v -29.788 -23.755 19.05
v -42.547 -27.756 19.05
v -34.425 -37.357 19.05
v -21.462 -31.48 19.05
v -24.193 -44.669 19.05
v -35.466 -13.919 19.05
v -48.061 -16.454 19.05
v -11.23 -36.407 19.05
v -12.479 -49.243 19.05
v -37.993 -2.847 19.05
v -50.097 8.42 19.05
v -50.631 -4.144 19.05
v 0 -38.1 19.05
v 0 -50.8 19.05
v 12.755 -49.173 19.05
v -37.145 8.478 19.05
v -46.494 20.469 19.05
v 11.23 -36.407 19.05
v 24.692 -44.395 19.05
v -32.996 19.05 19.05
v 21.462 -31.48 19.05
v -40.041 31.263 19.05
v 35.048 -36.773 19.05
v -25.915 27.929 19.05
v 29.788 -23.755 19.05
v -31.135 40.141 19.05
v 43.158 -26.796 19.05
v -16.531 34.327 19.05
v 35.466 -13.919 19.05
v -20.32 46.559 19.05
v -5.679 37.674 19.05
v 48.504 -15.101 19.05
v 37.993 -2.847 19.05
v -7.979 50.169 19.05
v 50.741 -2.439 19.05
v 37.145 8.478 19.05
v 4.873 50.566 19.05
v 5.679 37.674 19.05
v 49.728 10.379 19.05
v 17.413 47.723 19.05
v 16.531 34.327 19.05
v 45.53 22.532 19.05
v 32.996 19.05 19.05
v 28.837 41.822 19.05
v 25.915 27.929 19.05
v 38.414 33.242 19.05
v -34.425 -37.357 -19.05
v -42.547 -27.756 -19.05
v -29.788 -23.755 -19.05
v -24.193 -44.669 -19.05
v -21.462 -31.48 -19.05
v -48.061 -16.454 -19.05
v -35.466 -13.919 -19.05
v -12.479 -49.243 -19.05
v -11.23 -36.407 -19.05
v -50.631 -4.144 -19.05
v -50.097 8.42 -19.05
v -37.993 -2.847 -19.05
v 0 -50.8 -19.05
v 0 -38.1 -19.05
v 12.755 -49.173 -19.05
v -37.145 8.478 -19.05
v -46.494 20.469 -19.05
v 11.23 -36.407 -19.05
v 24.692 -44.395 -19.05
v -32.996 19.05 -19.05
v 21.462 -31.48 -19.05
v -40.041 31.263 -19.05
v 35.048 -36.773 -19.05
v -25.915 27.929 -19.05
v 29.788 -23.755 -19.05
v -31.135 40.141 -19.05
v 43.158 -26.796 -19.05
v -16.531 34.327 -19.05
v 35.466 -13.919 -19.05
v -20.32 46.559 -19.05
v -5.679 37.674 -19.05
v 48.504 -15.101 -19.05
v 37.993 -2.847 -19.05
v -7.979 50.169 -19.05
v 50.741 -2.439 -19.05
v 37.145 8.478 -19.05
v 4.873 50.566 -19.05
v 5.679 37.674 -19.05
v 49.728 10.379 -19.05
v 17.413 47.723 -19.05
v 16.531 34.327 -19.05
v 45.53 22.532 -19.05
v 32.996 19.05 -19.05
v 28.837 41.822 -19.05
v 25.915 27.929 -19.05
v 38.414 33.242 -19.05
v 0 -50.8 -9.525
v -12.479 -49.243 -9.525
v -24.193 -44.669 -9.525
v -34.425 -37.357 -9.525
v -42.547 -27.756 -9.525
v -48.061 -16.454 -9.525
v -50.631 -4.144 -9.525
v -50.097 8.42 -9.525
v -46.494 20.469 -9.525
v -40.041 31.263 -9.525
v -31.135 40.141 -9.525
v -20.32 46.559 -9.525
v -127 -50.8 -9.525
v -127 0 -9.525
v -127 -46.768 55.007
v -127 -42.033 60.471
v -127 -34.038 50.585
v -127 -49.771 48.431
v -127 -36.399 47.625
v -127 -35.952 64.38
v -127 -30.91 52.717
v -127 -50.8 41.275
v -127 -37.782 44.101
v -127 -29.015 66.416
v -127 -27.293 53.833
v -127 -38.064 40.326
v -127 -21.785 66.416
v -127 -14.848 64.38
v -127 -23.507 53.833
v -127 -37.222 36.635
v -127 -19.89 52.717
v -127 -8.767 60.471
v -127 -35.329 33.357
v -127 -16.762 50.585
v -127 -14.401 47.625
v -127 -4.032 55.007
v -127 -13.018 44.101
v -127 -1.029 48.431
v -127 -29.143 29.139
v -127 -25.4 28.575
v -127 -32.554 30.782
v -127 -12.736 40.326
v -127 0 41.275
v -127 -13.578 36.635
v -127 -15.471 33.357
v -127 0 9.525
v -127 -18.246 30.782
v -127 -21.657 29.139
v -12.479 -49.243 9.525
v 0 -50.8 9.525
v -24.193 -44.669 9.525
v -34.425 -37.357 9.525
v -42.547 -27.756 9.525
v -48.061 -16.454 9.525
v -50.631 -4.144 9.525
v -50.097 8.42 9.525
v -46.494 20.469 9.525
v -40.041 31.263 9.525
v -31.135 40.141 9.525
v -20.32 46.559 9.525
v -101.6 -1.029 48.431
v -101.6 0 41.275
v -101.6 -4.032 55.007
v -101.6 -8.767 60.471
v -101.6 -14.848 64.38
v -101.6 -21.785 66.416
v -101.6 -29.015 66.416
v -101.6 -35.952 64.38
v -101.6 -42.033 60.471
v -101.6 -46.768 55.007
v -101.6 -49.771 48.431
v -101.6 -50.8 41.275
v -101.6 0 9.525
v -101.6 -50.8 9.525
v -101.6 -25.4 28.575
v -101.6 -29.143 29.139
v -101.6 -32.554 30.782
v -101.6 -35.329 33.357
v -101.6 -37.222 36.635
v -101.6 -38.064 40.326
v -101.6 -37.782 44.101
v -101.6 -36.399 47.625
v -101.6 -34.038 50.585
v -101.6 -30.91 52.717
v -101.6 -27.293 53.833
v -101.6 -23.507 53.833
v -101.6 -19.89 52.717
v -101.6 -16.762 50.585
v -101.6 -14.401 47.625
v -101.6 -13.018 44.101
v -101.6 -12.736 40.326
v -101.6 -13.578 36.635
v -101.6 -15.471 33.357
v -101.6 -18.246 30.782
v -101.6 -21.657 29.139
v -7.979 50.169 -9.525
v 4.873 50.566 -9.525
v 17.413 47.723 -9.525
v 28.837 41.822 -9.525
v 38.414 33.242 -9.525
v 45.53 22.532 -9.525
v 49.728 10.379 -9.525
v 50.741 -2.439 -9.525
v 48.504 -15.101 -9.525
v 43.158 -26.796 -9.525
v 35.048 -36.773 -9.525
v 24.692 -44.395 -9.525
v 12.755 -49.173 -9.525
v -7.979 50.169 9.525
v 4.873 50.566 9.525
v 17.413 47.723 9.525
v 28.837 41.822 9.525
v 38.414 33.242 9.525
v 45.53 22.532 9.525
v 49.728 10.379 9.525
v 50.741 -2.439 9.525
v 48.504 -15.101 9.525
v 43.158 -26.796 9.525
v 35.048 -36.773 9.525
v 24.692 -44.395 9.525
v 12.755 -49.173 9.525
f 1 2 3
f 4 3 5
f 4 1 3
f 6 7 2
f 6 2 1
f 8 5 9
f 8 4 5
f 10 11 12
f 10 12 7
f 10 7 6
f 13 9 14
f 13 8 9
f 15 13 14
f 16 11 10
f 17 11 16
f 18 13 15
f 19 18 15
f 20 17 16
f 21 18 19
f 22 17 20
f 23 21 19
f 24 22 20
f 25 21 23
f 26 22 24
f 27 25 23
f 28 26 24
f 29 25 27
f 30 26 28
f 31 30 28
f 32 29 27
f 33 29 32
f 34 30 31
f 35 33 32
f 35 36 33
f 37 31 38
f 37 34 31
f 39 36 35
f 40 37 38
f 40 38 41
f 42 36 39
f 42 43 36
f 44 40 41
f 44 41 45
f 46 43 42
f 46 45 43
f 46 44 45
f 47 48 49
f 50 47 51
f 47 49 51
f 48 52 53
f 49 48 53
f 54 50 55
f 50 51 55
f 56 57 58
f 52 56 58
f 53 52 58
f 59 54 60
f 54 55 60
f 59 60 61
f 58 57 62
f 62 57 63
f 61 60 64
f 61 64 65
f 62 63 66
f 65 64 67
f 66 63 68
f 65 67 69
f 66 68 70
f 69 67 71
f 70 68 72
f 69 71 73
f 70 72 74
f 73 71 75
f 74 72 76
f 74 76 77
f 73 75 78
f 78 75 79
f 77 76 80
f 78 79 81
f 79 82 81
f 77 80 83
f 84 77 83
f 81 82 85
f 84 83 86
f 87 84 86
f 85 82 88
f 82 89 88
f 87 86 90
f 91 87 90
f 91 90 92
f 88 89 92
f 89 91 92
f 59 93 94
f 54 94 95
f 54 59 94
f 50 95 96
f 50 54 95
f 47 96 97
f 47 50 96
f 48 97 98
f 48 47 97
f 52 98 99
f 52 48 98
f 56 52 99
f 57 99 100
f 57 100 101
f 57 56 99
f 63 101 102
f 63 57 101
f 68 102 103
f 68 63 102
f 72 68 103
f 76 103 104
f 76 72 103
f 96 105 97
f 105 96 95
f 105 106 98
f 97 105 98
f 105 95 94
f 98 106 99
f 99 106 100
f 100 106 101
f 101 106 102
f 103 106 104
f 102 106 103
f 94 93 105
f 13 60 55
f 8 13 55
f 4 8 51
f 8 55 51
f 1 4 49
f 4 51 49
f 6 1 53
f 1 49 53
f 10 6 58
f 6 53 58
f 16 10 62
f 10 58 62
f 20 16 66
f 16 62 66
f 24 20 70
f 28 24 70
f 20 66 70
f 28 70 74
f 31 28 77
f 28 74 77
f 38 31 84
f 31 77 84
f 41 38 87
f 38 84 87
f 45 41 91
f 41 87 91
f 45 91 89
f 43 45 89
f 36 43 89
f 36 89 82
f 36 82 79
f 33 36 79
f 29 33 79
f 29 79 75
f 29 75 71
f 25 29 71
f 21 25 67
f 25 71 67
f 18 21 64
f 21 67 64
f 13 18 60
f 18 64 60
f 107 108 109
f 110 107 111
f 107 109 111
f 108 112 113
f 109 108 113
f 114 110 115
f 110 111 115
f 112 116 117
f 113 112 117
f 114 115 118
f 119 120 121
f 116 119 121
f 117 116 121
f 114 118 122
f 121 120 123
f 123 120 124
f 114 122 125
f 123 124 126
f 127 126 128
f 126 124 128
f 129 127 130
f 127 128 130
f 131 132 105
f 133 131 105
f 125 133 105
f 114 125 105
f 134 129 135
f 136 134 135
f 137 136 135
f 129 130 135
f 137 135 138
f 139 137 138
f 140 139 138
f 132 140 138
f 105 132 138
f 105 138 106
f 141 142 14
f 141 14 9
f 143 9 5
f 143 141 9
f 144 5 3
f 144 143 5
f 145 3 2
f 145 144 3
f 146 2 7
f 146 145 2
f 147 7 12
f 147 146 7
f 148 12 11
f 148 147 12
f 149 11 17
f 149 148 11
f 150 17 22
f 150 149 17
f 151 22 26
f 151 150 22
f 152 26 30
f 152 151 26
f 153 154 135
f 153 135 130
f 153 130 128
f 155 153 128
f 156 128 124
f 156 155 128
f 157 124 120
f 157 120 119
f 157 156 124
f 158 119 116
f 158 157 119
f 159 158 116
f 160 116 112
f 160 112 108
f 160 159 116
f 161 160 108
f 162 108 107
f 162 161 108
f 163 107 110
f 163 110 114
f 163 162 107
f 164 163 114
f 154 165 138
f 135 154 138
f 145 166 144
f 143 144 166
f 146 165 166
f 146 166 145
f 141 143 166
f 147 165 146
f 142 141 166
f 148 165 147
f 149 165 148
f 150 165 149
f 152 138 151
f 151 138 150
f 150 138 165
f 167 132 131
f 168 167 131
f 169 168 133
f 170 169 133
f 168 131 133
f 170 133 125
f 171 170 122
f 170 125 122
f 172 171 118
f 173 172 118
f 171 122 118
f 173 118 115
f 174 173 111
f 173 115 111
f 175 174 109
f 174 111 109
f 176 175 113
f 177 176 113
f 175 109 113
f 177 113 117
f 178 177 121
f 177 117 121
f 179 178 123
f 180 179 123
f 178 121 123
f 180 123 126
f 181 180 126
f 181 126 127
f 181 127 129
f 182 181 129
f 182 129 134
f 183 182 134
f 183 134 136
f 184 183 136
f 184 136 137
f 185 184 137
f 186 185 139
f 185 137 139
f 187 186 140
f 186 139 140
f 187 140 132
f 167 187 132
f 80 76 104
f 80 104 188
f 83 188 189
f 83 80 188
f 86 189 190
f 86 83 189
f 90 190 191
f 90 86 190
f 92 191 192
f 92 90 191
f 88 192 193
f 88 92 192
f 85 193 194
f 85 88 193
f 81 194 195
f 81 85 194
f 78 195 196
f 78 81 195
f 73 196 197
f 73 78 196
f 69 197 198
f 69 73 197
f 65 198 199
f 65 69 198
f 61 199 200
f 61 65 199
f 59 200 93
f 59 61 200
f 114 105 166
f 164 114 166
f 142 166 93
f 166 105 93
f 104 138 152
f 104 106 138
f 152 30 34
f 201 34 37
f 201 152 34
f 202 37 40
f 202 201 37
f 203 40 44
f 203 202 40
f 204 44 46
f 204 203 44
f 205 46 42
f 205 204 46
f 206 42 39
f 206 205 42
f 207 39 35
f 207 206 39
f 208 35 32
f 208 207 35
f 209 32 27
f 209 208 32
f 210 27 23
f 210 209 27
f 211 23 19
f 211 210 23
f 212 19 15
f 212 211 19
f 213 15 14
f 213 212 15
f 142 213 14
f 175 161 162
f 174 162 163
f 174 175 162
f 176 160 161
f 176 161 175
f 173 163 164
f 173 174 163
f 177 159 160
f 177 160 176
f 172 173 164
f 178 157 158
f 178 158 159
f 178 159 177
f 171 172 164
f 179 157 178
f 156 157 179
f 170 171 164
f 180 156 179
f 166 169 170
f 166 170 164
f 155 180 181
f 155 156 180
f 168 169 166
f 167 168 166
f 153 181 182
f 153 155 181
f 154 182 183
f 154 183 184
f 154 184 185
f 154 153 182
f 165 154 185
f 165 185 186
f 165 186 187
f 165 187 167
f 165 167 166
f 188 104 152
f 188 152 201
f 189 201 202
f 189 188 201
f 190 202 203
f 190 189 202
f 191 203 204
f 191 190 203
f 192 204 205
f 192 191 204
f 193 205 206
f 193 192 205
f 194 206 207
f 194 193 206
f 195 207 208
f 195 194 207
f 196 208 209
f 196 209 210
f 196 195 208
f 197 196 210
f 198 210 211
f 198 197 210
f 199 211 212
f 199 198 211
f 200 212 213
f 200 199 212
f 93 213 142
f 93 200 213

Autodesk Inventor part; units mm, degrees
ref_plane "YZ Plane" through (0, 0, 0) normal (1, 0, 0) x (0, 1, 0)
ref_plane "XZ Plane" through (0, 0, 0) normal (0, 1, 0) x (-1, 0, 0)
ref_plane "XY Plane" through (0, 0, 0) normal (0, 0, 1) x (1, 0, 0)
sketch "Sketch1" plane through (0, 0, 0) normal (0, 0, 1) x (1, 0, 0)
  circle A0 centre (0, 0) radius 50.8
  line L0 (0, -50.8) -> (-127, -50.8)
  line L1 (-127, -50.8) -> (-127, 0)
  line L2 (-127, 0) -> (-20.32, 46.559)
  dimension "d0" = 127
  dimension "d1" = 101.6
  dimension "d2" = 50.8
extrude "MAIN BODY" add sketch "Sketch1" along normal mid plane 19.05
sketch "Sketch2" plane through (0, 0, 0) normal (0, 0, 1) x (1, 0, 0)
  arc A0 (0, -50.8) -> (-20.32, 46.559) centre (0, 0) ccw projected
  circle A1 centre (0, 0) radius 50.8
  point P0 (0, -50.8)
  dimension "d5" = 101.6
extrude "MAIN BODY LIP" add sketch "Sketch2" along normal mid plane 38.1
sketch "Sketch3" plane through (0, 0, 9.525) normal (0, 0, 1) x (1, 0, 0)
  line L0 (-127, -50.8) -> (0, -50.8) projected
  line L1 (-127, -50.8) -> (-101.6, -50.8)
  line L2 (-101.6, -50.8) -> (-101.6, 0)
  line L3 (-101.6, 0) -> (-127, 0)
  line L4 (-127, 0) -> (-127, -50.8)
  point P0 (0, 0)
  point P1 (-101.6, -25.4)
  dimension "d8" = 25.4
  dimension "d9" = 50.8
extrude "SIDE EXT" add sketch "Sketch3" along normal blind 31.75
sketch "Sketch4" plane through (-101.6, -50.8, 9.525) normal (1, 0, 0) x (0, 0, -1)
  line L0 (-31.75, 0) -> (-31.75, 50.8) projected
  circle A0 centre (-31.75, 25.4) radius 25.4
  point P0 (9.525, 50.8)
extrude "SIDE EXT CURVE" add sketch "Sketch4" against normal blind 25.4 contours A0 L0 picked at (-40.1549, 26.4205)
sketch "Sketch5" plane through (-101.6, -50.8, 9.525) normal (1, 0, 0) x (0, 0, -1)
  arc A0 (-31.75, 50.8) -> (-31.75, 0) centre (-31.75, 25.4) ccw projected
  point P0 (9.525, 50.8)
hole "SIDE EXT HOLE" at (-101.6, -25.4, 41.275) direction (-1, 0, 0) diameter 25.4 end through all
sketch "Sketch6" plane through (0, 0, 19.05) normal (0, 0, 1) x (1, 0, 0)
  circle A0 centre (0, 0) radius 50.8 projected
hole "MAIN BODY HOLE" at (0, 0, 19.05) direction (0, 0, -1) diameter 76.2 end through all
properties part number "ANS7-4-BK" material "PET Plastic"
